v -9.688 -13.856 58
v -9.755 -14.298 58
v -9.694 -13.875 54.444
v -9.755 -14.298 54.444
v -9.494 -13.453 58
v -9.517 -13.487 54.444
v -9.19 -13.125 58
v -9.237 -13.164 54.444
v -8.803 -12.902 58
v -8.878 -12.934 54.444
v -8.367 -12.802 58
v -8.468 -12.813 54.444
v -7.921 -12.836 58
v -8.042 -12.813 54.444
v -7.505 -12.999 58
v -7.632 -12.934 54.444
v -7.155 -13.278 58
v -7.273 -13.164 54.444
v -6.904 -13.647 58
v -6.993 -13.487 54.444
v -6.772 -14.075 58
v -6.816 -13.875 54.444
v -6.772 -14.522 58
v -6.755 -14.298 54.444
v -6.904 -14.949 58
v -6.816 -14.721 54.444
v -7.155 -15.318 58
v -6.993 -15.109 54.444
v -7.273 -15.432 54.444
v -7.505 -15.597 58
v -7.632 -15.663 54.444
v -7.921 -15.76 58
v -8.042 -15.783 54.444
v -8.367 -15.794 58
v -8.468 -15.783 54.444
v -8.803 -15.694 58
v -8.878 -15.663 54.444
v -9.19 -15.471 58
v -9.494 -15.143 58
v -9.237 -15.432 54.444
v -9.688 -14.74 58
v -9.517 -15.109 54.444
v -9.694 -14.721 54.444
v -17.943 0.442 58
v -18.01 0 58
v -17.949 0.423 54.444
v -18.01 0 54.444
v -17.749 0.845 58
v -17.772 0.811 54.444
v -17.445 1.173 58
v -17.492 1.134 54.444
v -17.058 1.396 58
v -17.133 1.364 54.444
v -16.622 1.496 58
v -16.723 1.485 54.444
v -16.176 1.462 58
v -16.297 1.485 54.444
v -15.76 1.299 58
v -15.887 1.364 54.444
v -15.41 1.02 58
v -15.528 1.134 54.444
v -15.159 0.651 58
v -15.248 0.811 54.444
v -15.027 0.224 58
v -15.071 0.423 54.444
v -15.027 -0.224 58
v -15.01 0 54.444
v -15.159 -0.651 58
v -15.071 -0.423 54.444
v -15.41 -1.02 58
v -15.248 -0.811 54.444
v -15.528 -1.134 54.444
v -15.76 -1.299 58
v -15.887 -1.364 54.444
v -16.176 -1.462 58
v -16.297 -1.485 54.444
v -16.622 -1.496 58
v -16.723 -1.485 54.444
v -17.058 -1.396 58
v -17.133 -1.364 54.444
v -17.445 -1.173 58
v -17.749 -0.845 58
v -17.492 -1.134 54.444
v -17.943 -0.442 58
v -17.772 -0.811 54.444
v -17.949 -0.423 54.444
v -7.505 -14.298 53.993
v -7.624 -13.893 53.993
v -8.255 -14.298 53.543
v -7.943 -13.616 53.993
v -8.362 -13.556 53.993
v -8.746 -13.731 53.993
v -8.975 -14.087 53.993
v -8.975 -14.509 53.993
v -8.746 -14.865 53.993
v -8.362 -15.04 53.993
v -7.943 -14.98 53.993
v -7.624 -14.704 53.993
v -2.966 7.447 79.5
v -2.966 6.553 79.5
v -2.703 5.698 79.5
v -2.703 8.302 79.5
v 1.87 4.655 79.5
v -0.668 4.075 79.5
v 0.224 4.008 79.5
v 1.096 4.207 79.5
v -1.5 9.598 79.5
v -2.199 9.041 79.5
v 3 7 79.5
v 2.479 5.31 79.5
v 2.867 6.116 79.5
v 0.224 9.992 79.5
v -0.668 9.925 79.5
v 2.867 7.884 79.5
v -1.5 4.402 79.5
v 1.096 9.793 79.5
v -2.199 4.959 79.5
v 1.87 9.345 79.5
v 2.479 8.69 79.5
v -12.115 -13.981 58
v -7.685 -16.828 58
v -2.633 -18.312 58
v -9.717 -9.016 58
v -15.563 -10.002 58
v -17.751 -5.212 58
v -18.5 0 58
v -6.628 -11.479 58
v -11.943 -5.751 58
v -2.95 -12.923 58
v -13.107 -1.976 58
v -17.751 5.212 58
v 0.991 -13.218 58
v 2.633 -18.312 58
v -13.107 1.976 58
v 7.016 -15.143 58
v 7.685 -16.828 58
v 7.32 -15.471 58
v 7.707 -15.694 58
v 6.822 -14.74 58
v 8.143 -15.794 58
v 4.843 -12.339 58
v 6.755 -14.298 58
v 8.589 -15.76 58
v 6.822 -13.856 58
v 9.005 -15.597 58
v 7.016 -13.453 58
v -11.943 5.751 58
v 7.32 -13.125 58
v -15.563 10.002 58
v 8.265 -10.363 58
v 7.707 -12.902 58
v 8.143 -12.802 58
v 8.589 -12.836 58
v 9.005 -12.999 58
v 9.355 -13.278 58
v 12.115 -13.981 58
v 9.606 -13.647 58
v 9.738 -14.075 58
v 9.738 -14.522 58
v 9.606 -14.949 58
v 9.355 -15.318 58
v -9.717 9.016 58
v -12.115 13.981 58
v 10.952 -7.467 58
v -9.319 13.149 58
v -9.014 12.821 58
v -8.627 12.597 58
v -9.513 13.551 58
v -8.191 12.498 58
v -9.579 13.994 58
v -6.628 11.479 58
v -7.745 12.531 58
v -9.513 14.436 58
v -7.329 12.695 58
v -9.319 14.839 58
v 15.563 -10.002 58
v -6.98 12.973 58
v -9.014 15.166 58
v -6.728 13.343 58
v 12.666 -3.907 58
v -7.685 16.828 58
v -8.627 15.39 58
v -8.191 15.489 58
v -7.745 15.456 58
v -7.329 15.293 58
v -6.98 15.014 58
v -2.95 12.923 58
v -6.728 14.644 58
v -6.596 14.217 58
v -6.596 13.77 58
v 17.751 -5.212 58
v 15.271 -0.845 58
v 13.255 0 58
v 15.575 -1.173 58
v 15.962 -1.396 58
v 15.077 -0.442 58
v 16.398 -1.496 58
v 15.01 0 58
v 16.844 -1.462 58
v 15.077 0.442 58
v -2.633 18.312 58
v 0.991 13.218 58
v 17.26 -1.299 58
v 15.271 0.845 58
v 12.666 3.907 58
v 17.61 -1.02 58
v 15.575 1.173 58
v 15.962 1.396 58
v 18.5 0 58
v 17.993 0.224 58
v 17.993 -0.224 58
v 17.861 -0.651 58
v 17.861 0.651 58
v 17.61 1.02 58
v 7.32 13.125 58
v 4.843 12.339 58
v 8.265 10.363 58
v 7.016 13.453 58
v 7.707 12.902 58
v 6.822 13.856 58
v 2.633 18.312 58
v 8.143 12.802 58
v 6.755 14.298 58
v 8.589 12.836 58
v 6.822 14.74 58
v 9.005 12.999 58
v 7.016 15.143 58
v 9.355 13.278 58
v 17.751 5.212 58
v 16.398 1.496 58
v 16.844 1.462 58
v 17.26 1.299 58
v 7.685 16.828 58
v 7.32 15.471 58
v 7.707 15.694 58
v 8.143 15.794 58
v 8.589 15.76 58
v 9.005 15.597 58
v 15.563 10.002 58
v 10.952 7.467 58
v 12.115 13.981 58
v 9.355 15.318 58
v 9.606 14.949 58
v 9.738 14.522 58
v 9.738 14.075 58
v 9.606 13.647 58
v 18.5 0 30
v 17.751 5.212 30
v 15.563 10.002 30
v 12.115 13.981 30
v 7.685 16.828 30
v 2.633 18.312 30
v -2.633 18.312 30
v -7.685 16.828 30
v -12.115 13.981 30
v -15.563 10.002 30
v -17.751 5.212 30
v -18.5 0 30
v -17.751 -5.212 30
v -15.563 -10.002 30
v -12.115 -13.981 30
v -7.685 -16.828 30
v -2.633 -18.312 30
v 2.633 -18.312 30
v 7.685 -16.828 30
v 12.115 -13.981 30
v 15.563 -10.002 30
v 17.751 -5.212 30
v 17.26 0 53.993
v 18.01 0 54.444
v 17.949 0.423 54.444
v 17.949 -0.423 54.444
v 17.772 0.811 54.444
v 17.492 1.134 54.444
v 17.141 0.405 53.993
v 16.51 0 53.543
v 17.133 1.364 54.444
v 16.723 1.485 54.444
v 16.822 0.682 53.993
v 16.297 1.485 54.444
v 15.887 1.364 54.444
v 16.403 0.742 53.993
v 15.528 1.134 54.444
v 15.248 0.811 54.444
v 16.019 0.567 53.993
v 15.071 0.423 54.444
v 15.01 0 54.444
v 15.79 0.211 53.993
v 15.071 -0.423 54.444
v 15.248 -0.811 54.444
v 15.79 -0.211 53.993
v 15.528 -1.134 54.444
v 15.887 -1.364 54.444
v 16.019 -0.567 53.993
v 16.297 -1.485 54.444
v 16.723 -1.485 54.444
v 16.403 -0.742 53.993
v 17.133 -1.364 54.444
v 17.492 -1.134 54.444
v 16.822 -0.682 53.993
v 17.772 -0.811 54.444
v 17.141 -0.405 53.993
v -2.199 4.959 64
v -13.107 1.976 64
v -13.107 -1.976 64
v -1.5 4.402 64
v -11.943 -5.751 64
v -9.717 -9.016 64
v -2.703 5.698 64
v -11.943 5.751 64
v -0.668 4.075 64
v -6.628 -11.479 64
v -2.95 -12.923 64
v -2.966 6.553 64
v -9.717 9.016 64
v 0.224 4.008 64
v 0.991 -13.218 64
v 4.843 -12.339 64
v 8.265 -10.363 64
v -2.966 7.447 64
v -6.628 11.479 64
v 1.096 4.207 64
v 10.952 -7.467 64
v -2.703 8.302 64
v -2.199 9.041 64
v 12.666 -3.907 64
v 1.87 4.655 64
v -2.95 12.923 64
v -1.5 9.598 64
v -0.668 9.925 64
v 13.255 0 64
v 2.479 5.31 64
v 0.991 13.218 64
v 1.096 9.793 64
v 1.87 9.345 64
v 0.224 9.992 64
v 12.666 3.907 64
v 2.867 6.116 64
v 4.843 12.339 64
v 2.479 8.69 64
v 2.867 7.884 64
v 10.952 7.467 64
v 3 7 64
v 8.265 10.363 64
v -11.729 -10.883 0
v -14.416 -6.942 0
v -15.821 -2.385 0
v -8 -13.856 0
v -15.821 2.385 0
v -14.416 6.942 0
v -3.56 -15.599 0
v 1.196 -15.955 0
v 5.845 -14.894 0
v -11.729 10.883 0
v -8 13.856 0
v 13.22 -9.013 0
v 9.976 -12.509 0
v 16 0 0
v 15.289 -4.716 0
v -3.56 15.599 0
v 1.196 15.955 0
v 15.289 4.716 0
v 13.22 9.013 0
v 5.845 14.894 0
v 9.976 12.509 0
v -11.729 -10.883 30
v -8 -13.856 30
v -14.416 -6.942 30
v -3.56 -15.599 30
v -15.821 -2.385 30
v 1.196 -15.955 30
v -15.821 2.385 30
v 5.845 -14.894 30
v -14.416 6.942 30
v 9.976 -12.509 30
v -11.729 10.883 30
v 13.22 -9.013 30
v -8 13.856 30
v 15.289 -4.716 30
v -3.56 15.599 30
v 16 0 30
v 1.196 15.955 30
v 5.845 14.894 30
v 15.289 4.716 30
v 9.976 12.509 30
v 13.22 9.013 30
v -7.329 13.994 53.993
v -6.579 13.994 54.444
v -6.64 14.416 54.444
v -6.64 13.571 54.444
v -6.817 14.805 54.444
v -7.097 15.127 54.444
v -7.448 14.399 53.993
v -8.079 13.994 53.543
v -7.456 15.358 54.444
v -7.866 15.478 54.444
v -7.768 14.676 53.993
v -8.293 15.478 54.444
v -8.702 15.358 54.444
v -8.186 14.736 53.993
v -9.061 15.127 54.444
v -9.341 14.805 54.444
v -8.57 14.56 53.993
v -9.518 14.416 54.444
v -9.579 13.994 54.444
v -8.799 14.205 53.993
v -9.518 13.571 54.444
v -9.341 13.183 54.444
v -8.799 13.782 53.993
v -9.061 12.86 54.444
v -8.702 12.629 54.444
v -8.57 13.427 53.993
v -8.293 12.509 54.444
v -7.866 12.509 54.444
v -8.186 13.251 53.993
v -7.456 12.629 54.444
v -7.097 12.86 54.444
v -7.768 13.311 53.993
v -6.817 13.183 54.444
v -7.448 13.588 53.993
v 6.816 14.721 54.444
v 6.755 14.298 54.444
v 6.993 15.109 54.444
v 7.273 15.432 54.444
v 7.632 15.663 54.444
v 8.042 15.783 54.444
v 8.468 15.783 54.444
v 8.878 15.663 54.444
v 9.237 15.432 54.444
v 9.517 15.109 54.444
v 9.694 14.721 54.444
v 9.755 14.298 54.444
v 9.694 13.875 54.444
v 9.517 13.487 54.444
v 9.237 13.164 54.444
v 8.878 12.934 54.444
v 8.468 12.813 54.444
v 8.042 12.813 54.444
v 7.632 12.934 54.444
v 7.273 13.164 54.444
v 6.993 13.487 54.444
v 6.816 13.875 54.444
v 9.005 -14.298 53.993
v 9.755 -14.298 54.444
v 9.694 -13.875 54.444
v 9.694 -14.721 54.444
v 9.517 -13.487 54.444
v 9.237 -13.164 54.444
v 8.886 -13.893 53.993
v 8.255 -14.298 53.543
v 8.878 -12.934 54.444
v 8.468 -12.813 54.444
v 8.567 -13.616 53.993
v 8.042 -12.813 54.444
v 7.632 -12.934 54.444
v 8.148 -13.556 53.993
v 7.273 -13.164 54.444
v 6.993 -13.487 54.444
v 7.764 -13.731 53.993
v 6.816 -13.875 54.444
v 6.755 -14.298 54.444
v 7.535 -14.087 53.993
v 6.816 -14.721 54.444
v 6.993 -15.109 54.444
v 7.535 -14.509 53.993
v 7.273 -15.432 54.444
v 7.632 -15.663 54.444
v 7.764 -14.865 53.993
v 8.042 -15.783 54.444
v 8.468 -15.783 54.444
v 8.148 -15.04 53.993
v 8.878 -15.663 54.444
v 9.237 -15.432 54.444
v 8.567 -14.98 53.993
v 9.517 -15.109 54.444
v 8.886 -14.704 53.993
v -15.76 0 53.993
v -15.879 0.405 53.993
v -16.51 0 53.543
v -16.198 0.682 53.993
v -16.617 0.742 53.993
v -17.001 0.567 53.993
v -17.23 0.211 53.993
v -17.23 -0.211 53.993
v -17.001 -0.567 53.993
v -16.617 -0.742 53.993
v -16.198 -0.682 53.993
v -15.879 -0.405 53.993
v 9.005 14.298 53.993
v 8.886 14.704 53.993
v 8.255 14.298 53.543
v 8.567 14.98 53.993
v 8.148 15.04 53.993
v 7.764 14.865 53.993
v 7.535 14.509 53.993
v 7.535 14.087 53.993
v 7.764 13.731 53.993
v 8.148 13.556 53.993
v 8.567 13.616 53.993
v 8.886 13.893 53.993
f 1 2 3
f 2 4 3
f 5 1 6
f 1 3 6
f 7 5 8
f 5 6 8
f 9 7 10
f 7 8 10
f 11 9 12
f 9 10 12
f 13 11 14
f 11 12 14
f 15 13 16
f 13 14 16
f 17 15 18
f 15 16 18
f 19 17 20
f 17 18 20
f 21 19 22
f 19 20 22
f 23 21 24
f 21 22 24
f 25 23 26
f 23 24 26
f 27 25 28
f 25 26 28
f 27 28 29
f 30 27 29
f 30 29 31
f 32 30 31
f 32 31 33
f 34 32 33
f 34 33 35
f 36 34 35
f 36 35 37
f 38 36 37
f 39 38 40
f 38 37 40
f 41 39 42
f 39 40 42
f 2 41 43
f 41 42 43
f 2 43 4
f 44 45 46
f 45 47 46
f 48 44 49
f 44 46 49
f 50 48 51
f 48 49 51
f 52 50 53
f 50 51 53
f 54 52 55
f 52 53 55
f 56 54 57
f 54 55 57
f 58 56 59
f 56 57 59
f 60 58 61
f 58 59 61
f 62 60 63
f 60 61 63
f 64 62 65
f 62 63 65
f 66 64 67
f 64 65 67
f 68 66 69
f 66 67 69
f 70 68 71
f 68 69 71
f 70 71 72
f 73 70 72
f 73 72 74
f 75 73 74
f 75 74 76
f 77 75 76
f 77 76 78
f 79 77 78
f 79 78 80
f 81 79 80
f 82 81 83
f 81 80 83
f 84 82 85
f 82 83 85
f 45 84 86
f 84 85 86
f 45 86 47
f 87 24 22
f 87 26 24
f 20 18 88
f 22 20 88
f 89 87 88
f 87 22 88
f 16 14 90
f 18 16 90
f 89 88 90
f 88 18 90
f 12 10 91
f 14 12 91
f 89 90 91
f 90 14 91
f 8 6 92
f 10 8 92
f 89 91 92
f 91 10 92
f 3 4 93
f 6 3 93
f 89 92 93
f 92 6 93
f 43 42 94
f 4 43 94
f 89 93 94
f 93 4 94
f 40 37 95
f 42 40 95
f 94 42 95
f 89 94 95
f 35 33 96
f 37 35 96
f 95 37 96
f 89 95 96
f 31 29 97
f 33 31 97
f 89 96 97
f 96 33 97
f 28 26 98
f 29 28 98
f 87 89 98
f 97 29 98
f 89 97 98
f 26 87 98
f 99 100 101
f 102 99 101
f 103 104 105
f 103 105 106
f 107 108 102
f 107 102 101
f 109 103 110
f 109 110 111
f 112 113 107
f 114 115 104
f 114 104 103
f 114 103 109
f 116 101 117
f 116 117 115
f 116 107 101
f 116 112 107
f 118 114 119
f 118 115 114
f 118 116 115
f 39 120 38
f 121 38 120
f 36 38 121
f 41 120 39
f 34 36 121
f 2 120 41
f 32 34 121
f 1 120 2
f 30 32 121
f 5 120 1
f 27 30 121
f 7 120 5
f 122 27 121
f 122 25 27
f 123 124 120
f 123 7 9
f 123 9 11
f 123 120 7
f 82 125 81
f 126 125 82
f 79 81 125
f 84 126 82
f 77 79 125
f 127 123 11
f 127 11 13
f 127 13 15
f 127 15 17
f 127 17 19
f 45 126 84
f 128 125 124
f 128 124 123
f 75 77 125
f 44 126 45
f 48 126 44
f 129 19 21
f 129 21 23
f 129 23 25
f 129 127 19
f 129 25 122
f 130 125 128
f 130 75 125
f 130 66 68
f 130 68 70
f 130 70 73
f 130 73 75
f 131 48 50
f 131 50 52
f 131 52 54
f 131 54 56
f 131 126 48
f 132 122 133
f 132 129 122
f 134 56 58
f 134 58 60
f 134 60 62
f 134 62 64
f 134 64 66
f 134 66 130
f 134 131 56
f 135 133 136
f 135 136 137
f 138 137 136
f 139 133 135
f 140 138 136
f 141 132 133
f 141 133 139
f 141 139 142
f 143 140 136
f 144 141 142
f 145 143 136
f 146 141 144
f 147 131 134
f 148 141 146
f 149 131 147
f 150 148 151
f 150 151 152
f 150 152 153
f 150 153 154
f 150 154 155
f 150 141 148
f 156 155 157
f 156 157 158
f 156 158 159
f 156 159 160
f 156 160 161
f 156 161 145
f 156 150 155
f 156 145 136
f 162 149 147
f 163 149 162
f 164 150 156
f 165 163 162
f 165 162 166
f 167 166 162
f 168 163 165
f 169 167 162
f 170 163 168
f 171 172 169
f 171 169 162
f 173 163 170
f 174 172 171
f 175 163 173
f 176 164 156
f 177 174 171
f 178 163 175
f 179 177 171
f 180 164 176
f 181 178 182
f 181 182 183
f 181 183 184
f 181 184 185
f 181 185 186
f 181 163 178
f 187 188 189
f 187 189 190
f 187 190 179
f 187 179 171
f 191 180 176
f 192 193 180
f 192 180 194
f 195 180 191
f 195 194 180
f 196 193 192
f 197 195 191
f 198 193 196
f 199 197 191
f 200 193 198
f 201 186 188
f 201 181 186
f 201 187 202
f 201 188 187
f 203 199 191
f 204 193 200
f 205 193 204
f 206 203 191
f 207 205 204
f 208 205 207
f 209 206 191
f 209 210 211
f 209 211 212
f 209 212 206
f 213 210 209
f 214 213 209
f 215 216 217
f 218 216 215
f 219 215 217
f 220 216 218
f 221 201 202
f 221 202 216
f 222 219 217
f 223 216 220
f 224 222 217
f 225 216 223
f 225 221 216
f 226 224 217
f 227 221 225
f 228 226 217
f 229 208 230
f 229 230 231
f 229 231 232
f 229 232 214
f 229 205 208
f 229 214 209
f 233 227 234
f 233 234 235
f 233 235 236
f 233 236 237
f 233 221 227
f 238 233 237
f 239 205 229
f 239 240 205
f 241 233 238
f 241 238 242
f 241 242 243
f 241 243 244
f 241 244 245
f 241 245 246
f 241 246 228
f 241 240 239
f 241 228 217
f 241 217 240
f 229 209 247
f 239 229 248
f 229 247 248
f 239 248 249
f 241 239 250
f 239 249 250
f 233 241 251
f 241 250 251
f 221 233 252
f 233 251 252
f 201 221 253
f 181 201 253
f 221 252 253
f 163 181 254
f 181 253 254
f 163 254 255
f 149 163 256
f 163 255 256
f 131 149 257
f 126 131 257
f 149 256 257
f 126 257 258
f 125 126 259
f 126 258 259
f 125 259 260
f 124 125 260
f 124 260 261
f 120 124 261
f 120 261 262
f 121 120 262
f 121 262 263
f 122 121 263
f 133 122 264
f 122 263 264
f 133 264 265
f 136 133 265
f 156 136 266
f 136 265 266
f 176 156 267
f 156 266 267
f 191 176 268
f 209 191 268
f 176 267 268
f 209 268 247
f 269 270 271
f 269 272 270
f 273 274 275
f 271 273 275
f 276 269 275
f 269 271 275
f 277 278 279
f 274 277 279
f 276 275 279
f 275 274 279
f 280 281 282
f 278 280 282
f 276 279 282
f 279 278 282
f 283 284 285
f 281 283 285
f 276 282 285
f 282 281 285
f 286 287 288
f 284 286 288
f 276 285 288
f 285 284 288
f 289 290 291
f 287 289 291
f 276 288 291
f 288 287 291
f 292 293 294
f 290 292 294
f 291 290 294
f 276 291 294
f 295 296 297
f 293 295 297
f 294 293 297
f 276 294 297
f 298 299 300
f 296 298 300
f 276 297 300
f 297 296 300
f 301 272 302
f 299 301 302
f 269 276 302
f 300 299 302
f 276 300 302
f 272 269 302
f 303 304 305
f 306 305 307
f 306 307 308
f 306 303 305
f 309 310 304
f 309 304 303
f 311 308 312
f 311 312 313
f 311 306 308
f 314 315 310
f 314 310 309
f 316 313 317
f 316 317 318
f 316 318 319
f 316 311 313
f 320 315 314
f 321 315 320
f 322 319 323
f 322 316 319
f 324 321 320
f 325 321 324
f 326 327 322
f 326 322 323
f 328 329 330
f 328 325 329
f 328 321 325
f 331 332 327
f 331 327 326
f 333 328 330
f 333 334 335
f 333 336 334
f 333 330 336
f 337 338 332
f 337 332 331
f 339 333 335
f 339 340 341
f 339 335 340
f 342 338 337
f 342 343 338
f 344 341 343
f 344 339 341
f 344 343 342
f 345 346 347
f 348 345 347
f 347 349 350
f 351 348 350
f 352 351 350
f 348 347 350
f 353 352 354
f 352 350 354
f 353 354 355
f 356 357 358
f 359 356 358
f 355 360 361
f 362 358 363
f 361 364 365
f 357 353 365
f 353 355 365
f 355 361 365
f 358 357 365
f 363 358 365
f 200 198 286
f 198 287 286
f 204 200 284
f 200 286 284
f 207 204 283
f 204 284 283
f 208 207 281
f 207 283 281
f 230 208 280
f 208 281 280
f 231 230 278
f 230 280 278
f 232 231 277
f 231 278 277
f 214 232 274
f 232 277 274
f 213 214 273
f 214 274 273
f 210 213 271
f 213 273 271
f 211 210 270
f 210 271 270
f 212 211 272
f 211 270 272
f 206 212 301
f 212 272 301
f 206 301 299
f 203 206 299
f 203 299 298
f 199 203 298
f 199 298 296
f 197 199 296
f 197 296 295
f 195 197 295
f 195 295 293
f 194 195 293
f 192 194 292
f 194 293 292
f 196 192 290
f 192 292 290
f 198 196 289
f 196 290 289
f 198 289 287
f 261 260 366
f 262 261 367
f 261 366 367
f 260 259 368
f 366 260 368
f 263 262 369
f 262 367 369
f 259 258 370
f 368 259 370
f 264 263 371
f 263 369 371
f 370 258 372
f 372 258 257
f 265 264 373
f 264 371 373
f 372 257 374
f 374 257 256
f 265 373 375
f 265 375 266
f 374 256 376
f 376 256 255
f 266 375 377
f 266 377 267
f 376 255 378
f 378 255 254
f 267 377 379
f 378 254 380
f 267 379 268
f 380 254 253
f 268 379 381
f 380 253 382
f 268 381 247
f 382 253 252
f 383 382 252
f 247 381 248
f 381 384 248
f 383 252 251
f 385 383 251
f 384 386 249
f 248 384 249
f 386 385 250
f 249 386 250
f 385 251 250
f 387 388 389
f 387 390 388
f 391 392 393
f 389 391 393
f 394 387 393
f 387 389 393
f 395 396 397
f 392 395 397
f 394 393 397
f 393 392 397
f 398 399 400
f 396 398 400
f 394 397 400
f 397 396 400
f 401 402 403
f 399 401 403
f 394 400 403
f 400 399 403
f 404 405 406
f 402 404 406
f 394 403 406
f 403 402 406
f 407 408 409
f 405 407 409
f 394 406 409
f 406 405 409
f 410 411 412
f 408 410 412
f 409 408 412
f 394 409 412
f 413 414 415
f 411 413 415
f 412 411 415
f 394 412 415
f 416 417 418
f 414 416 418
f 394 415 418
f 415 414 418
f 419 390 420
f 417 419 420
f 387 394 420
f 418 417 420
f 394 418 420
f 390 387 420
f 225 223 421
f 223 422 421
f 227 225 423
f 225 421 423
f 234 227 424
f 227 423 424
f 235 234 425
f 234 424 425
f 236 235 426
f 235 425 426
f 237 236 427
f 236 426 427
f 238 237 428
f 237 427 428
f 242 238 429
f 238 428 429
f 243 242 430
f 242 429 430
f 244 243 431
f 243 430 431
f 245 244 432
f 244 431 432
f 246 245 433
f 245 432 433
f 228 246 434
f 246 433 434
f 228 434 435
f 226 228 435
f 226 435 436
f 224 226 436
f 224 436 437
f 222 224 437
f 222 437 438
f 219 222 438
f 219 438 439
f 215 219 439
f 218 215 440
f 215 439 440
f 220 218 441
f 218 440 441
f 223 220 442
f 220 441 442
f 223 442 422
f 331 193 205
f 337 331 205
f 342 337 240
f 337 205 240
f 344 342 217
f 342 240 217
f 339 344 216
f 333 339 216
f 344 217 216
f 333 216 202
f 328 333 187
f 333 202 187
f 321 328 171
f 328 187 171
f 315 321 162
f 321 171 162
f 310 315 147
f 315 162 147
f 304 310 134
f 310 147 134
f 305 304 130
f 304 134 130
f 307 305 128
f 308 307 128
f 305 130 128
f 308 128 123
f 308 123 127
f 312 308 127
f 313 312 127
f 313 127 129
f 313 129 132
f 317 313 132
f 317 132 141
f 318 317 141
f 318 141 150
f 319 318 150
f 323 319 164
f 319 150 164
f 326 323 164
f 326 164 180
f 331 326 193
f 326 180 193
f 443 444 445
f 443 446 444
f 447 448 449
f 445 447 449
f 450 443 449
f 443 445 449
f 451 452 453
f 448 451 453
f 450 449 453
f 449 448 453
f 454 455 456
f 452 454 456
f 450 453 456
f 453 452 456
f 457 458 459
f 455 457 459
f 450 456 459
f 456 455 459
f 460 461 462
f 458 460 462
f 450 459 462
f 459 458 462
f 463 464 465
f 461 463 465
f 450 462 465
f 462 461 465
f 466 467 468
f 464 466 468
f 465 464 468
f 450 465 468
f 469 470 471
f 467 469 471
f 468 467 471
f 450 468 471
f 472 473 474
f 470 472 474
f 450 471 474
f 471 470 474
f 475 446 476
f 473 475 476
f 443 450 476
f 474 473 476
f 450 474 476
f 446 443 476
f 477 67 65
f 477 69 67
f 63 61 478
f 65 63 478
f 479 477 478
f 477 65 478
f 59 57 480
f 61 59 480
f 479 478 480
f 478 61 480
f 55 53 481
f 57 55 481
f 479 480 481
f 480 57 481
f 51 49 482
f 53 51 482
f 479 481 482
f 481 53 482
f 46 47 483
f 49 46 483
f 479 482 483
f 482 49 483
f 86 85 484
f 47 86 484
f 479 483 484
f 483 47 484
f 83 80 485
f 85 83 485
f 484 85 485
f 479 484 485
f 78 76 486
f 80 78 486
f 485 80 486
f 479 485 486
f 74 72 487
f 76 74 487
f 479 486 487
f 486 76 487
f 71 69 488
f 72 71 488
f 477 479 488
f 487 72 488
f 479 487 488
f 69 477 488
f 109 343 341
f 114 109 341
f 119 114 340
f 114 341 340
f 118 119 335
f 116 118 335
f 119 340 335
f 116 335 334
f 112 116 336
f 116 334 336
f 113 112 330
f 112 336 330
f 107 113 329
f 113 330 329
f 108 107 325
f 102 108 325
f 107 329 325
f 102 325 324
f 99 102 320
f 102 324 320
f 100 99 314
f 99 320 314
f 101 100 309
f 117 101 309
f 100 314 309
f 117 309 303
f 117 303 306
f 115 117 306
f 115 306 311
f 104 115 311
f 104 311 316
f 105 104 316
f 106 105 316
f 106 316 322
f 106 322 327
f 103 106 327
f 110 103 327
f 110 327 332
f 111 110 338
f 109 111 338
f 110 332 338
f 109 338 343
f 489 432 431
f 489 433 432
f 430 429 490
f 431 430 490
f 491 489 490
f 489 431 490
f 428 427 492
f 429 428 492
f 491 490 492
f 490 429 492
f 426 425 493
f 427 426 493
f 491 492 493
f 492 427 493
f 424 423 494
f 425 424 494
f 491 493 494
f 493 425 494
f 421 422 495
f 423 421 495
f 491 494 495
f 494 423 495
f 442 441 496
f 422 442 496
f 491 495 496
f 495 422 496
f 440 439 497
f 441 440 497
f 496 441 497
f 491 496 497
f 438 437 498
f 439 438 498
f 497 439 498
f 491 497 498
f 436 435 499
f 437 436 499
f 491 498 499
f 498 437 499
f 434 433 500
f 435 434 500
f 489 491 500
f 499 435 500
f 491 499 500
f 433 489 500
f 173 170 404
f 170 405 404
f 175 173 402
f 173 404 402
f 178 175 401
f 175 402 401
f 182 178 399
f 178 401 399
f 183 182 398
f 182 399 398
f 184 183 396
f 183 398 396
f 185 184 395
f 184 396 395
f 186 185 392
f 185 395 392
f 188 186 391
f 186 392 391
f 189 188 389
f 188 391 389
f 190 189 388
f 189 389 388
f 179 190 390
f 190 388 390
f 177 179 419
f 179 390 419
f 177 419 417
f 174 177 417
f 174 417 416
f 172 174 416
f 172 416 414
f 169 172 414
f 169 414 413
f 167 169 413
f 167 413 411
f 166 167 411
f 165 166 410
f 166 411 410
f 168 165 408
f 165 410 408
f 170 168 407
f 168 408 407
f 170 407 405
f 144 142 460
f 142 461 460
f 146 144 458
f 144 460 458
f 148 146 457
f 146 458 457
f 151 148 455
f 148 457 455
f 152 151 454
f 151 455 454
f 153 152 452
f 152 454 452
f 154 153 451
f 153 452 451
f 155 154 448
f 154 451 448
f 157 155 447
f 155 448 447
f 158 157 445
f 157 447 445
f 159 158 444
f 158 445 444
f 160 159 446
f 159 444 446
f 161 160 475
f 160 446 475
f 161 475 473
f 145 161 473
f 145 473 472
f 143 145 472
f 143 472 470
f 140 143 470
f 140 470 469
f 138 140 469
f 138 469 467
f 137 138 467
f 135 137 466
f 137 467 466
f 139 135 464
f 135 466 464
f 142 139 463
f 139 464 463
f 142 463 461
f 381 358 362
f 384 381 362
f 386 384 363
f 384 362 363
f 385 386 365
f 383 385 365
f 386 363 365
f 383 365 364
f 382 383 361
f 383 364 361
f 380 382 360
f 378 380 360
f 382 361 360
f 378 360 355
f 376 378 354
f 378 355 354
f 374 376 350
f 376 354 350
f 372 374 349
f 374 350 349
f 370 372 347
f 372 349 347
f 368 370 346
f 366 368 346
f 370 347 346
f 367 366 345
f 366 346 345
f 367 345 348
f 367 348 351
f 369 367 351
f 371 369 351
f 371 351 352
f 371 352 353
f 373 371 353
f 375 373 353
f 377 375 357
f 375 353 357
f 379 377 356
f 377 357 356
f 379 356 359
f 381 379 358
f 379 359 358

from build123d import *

# Parameters (mm, degrees)
SKETCH1_R                    = 16
BOSS_EXTRUDE1_DEPTH          = 30
SKETCH2_R                    = 18.5
BOSS_EXTRUDE2_DEPTH          = 28
SKETCH3_R                    = 13.255383993
BOSS_EXTRUDE3_DEPTH          = 6
SKETCH4_R                    = 3
BOSS_EXTRUDE4_DEPTH          = 15.5
F_3_0_3_DIAMETER_HOLE2_D     = 3
F_3_0_3_DIAMETER_HOLE2_DEPTH = 3.556
F_3_0_3_DIAMETER_HOLE2_TIP   = 0.901290929
F_3_0_3_DIAMETER_HOLE1_D     = 3
F_3_0_3_DIAMETER_HOLE1_DEPTH = 3.499993
F_3_0_3_DIAMETER_HOLE1_TIP   = 0.901290929


with BuildPart() as part:
    # Sketch1 → Boss-Extrude1 (new body)
    with BuildSketch(Plane.XY):
        Circle(SKETCH1_R)
    extrude(amount=BOSS_EXTRUDE1_DEPTH)

    # Sketch2 → Boss-Extrude2 (add)
    with BuildSketch(Plane.XY.offset(30)):
        Circle(SKETCH2_R)
    extrude(amount=BOSS_EXTRUDE2_DEPTH)

    # Sketch3 → Boss-Extrude3 (add)
    with BuildSketch(Plane.XY.offset(58)):
        Circle(SKETCH3_R)
    extrude(amount=BOSS_EXTRUDE3_DEPTH)

    # Sketch4 → Boss-Extrude4 (add)
    with BuildSketch(Plane.XY.offset(64)):
        with Locations((0, 7)):
            Circle(SKETCH4_R)
    extrude(amount=BOSS_EXTRUDE4_DEPTH)

    # Ø3.0 (3) Diameter Hole2
    with Locations(Plane.XY.offset(58)):
        with Locations((-8.079199421, 13.993583881), (-16.51, 0), (8.255, -14.298079416), (-8.255, -14.298079416), (8.255, 14.298079416), (16.51, 0)):
            Hole(F_3_0_3_DIAMETER_HOLE2_D / 2, depth=F_3_0_3_DIAMETER_HOLE2_DEPTH)
            with Locations((0, 0, -(F_3_0_3_DIAMETER_HOLE2_DEPTH + F_3_0_3_DIAMETER_HOLE2_TIP / 2))):  # 118° drill point
                Cone(0, F_3_0_3_DIAMETER_HOLE2_D / 2, F_3_0_3_DIAMETER_HOLE2_TIP, mode=Mode.SUBTRACT)

    # Ø3.0 (3) Diameter Hole1
    with Locations(Plane.XY.offset(58)):
        with Locations((-16.51, 0), (8.255, -14.298079416), (16.51, 0), (8.255, 14.298079416)):
            Hole(F_3_0_3_DIAMETER_HOLE1_D / 2, depth=F_3_0_3_DIAMETER_HOLE1_DEPTH)
            with Locations((0, 0, -(F_3_0_3_DIAMETER_HOLE1_DEPTH + F_3_0_3_DIAMETER_HOLE1_TIP / 2))):  # 118° drill point
                Cone(0, F_3_0_3_DIAMETER_HOLE1_D / 2, F_3_0_3_DIAMETER_HOLE1_TIP, mode=Mode.SUBTRACT)


solid = part.part
